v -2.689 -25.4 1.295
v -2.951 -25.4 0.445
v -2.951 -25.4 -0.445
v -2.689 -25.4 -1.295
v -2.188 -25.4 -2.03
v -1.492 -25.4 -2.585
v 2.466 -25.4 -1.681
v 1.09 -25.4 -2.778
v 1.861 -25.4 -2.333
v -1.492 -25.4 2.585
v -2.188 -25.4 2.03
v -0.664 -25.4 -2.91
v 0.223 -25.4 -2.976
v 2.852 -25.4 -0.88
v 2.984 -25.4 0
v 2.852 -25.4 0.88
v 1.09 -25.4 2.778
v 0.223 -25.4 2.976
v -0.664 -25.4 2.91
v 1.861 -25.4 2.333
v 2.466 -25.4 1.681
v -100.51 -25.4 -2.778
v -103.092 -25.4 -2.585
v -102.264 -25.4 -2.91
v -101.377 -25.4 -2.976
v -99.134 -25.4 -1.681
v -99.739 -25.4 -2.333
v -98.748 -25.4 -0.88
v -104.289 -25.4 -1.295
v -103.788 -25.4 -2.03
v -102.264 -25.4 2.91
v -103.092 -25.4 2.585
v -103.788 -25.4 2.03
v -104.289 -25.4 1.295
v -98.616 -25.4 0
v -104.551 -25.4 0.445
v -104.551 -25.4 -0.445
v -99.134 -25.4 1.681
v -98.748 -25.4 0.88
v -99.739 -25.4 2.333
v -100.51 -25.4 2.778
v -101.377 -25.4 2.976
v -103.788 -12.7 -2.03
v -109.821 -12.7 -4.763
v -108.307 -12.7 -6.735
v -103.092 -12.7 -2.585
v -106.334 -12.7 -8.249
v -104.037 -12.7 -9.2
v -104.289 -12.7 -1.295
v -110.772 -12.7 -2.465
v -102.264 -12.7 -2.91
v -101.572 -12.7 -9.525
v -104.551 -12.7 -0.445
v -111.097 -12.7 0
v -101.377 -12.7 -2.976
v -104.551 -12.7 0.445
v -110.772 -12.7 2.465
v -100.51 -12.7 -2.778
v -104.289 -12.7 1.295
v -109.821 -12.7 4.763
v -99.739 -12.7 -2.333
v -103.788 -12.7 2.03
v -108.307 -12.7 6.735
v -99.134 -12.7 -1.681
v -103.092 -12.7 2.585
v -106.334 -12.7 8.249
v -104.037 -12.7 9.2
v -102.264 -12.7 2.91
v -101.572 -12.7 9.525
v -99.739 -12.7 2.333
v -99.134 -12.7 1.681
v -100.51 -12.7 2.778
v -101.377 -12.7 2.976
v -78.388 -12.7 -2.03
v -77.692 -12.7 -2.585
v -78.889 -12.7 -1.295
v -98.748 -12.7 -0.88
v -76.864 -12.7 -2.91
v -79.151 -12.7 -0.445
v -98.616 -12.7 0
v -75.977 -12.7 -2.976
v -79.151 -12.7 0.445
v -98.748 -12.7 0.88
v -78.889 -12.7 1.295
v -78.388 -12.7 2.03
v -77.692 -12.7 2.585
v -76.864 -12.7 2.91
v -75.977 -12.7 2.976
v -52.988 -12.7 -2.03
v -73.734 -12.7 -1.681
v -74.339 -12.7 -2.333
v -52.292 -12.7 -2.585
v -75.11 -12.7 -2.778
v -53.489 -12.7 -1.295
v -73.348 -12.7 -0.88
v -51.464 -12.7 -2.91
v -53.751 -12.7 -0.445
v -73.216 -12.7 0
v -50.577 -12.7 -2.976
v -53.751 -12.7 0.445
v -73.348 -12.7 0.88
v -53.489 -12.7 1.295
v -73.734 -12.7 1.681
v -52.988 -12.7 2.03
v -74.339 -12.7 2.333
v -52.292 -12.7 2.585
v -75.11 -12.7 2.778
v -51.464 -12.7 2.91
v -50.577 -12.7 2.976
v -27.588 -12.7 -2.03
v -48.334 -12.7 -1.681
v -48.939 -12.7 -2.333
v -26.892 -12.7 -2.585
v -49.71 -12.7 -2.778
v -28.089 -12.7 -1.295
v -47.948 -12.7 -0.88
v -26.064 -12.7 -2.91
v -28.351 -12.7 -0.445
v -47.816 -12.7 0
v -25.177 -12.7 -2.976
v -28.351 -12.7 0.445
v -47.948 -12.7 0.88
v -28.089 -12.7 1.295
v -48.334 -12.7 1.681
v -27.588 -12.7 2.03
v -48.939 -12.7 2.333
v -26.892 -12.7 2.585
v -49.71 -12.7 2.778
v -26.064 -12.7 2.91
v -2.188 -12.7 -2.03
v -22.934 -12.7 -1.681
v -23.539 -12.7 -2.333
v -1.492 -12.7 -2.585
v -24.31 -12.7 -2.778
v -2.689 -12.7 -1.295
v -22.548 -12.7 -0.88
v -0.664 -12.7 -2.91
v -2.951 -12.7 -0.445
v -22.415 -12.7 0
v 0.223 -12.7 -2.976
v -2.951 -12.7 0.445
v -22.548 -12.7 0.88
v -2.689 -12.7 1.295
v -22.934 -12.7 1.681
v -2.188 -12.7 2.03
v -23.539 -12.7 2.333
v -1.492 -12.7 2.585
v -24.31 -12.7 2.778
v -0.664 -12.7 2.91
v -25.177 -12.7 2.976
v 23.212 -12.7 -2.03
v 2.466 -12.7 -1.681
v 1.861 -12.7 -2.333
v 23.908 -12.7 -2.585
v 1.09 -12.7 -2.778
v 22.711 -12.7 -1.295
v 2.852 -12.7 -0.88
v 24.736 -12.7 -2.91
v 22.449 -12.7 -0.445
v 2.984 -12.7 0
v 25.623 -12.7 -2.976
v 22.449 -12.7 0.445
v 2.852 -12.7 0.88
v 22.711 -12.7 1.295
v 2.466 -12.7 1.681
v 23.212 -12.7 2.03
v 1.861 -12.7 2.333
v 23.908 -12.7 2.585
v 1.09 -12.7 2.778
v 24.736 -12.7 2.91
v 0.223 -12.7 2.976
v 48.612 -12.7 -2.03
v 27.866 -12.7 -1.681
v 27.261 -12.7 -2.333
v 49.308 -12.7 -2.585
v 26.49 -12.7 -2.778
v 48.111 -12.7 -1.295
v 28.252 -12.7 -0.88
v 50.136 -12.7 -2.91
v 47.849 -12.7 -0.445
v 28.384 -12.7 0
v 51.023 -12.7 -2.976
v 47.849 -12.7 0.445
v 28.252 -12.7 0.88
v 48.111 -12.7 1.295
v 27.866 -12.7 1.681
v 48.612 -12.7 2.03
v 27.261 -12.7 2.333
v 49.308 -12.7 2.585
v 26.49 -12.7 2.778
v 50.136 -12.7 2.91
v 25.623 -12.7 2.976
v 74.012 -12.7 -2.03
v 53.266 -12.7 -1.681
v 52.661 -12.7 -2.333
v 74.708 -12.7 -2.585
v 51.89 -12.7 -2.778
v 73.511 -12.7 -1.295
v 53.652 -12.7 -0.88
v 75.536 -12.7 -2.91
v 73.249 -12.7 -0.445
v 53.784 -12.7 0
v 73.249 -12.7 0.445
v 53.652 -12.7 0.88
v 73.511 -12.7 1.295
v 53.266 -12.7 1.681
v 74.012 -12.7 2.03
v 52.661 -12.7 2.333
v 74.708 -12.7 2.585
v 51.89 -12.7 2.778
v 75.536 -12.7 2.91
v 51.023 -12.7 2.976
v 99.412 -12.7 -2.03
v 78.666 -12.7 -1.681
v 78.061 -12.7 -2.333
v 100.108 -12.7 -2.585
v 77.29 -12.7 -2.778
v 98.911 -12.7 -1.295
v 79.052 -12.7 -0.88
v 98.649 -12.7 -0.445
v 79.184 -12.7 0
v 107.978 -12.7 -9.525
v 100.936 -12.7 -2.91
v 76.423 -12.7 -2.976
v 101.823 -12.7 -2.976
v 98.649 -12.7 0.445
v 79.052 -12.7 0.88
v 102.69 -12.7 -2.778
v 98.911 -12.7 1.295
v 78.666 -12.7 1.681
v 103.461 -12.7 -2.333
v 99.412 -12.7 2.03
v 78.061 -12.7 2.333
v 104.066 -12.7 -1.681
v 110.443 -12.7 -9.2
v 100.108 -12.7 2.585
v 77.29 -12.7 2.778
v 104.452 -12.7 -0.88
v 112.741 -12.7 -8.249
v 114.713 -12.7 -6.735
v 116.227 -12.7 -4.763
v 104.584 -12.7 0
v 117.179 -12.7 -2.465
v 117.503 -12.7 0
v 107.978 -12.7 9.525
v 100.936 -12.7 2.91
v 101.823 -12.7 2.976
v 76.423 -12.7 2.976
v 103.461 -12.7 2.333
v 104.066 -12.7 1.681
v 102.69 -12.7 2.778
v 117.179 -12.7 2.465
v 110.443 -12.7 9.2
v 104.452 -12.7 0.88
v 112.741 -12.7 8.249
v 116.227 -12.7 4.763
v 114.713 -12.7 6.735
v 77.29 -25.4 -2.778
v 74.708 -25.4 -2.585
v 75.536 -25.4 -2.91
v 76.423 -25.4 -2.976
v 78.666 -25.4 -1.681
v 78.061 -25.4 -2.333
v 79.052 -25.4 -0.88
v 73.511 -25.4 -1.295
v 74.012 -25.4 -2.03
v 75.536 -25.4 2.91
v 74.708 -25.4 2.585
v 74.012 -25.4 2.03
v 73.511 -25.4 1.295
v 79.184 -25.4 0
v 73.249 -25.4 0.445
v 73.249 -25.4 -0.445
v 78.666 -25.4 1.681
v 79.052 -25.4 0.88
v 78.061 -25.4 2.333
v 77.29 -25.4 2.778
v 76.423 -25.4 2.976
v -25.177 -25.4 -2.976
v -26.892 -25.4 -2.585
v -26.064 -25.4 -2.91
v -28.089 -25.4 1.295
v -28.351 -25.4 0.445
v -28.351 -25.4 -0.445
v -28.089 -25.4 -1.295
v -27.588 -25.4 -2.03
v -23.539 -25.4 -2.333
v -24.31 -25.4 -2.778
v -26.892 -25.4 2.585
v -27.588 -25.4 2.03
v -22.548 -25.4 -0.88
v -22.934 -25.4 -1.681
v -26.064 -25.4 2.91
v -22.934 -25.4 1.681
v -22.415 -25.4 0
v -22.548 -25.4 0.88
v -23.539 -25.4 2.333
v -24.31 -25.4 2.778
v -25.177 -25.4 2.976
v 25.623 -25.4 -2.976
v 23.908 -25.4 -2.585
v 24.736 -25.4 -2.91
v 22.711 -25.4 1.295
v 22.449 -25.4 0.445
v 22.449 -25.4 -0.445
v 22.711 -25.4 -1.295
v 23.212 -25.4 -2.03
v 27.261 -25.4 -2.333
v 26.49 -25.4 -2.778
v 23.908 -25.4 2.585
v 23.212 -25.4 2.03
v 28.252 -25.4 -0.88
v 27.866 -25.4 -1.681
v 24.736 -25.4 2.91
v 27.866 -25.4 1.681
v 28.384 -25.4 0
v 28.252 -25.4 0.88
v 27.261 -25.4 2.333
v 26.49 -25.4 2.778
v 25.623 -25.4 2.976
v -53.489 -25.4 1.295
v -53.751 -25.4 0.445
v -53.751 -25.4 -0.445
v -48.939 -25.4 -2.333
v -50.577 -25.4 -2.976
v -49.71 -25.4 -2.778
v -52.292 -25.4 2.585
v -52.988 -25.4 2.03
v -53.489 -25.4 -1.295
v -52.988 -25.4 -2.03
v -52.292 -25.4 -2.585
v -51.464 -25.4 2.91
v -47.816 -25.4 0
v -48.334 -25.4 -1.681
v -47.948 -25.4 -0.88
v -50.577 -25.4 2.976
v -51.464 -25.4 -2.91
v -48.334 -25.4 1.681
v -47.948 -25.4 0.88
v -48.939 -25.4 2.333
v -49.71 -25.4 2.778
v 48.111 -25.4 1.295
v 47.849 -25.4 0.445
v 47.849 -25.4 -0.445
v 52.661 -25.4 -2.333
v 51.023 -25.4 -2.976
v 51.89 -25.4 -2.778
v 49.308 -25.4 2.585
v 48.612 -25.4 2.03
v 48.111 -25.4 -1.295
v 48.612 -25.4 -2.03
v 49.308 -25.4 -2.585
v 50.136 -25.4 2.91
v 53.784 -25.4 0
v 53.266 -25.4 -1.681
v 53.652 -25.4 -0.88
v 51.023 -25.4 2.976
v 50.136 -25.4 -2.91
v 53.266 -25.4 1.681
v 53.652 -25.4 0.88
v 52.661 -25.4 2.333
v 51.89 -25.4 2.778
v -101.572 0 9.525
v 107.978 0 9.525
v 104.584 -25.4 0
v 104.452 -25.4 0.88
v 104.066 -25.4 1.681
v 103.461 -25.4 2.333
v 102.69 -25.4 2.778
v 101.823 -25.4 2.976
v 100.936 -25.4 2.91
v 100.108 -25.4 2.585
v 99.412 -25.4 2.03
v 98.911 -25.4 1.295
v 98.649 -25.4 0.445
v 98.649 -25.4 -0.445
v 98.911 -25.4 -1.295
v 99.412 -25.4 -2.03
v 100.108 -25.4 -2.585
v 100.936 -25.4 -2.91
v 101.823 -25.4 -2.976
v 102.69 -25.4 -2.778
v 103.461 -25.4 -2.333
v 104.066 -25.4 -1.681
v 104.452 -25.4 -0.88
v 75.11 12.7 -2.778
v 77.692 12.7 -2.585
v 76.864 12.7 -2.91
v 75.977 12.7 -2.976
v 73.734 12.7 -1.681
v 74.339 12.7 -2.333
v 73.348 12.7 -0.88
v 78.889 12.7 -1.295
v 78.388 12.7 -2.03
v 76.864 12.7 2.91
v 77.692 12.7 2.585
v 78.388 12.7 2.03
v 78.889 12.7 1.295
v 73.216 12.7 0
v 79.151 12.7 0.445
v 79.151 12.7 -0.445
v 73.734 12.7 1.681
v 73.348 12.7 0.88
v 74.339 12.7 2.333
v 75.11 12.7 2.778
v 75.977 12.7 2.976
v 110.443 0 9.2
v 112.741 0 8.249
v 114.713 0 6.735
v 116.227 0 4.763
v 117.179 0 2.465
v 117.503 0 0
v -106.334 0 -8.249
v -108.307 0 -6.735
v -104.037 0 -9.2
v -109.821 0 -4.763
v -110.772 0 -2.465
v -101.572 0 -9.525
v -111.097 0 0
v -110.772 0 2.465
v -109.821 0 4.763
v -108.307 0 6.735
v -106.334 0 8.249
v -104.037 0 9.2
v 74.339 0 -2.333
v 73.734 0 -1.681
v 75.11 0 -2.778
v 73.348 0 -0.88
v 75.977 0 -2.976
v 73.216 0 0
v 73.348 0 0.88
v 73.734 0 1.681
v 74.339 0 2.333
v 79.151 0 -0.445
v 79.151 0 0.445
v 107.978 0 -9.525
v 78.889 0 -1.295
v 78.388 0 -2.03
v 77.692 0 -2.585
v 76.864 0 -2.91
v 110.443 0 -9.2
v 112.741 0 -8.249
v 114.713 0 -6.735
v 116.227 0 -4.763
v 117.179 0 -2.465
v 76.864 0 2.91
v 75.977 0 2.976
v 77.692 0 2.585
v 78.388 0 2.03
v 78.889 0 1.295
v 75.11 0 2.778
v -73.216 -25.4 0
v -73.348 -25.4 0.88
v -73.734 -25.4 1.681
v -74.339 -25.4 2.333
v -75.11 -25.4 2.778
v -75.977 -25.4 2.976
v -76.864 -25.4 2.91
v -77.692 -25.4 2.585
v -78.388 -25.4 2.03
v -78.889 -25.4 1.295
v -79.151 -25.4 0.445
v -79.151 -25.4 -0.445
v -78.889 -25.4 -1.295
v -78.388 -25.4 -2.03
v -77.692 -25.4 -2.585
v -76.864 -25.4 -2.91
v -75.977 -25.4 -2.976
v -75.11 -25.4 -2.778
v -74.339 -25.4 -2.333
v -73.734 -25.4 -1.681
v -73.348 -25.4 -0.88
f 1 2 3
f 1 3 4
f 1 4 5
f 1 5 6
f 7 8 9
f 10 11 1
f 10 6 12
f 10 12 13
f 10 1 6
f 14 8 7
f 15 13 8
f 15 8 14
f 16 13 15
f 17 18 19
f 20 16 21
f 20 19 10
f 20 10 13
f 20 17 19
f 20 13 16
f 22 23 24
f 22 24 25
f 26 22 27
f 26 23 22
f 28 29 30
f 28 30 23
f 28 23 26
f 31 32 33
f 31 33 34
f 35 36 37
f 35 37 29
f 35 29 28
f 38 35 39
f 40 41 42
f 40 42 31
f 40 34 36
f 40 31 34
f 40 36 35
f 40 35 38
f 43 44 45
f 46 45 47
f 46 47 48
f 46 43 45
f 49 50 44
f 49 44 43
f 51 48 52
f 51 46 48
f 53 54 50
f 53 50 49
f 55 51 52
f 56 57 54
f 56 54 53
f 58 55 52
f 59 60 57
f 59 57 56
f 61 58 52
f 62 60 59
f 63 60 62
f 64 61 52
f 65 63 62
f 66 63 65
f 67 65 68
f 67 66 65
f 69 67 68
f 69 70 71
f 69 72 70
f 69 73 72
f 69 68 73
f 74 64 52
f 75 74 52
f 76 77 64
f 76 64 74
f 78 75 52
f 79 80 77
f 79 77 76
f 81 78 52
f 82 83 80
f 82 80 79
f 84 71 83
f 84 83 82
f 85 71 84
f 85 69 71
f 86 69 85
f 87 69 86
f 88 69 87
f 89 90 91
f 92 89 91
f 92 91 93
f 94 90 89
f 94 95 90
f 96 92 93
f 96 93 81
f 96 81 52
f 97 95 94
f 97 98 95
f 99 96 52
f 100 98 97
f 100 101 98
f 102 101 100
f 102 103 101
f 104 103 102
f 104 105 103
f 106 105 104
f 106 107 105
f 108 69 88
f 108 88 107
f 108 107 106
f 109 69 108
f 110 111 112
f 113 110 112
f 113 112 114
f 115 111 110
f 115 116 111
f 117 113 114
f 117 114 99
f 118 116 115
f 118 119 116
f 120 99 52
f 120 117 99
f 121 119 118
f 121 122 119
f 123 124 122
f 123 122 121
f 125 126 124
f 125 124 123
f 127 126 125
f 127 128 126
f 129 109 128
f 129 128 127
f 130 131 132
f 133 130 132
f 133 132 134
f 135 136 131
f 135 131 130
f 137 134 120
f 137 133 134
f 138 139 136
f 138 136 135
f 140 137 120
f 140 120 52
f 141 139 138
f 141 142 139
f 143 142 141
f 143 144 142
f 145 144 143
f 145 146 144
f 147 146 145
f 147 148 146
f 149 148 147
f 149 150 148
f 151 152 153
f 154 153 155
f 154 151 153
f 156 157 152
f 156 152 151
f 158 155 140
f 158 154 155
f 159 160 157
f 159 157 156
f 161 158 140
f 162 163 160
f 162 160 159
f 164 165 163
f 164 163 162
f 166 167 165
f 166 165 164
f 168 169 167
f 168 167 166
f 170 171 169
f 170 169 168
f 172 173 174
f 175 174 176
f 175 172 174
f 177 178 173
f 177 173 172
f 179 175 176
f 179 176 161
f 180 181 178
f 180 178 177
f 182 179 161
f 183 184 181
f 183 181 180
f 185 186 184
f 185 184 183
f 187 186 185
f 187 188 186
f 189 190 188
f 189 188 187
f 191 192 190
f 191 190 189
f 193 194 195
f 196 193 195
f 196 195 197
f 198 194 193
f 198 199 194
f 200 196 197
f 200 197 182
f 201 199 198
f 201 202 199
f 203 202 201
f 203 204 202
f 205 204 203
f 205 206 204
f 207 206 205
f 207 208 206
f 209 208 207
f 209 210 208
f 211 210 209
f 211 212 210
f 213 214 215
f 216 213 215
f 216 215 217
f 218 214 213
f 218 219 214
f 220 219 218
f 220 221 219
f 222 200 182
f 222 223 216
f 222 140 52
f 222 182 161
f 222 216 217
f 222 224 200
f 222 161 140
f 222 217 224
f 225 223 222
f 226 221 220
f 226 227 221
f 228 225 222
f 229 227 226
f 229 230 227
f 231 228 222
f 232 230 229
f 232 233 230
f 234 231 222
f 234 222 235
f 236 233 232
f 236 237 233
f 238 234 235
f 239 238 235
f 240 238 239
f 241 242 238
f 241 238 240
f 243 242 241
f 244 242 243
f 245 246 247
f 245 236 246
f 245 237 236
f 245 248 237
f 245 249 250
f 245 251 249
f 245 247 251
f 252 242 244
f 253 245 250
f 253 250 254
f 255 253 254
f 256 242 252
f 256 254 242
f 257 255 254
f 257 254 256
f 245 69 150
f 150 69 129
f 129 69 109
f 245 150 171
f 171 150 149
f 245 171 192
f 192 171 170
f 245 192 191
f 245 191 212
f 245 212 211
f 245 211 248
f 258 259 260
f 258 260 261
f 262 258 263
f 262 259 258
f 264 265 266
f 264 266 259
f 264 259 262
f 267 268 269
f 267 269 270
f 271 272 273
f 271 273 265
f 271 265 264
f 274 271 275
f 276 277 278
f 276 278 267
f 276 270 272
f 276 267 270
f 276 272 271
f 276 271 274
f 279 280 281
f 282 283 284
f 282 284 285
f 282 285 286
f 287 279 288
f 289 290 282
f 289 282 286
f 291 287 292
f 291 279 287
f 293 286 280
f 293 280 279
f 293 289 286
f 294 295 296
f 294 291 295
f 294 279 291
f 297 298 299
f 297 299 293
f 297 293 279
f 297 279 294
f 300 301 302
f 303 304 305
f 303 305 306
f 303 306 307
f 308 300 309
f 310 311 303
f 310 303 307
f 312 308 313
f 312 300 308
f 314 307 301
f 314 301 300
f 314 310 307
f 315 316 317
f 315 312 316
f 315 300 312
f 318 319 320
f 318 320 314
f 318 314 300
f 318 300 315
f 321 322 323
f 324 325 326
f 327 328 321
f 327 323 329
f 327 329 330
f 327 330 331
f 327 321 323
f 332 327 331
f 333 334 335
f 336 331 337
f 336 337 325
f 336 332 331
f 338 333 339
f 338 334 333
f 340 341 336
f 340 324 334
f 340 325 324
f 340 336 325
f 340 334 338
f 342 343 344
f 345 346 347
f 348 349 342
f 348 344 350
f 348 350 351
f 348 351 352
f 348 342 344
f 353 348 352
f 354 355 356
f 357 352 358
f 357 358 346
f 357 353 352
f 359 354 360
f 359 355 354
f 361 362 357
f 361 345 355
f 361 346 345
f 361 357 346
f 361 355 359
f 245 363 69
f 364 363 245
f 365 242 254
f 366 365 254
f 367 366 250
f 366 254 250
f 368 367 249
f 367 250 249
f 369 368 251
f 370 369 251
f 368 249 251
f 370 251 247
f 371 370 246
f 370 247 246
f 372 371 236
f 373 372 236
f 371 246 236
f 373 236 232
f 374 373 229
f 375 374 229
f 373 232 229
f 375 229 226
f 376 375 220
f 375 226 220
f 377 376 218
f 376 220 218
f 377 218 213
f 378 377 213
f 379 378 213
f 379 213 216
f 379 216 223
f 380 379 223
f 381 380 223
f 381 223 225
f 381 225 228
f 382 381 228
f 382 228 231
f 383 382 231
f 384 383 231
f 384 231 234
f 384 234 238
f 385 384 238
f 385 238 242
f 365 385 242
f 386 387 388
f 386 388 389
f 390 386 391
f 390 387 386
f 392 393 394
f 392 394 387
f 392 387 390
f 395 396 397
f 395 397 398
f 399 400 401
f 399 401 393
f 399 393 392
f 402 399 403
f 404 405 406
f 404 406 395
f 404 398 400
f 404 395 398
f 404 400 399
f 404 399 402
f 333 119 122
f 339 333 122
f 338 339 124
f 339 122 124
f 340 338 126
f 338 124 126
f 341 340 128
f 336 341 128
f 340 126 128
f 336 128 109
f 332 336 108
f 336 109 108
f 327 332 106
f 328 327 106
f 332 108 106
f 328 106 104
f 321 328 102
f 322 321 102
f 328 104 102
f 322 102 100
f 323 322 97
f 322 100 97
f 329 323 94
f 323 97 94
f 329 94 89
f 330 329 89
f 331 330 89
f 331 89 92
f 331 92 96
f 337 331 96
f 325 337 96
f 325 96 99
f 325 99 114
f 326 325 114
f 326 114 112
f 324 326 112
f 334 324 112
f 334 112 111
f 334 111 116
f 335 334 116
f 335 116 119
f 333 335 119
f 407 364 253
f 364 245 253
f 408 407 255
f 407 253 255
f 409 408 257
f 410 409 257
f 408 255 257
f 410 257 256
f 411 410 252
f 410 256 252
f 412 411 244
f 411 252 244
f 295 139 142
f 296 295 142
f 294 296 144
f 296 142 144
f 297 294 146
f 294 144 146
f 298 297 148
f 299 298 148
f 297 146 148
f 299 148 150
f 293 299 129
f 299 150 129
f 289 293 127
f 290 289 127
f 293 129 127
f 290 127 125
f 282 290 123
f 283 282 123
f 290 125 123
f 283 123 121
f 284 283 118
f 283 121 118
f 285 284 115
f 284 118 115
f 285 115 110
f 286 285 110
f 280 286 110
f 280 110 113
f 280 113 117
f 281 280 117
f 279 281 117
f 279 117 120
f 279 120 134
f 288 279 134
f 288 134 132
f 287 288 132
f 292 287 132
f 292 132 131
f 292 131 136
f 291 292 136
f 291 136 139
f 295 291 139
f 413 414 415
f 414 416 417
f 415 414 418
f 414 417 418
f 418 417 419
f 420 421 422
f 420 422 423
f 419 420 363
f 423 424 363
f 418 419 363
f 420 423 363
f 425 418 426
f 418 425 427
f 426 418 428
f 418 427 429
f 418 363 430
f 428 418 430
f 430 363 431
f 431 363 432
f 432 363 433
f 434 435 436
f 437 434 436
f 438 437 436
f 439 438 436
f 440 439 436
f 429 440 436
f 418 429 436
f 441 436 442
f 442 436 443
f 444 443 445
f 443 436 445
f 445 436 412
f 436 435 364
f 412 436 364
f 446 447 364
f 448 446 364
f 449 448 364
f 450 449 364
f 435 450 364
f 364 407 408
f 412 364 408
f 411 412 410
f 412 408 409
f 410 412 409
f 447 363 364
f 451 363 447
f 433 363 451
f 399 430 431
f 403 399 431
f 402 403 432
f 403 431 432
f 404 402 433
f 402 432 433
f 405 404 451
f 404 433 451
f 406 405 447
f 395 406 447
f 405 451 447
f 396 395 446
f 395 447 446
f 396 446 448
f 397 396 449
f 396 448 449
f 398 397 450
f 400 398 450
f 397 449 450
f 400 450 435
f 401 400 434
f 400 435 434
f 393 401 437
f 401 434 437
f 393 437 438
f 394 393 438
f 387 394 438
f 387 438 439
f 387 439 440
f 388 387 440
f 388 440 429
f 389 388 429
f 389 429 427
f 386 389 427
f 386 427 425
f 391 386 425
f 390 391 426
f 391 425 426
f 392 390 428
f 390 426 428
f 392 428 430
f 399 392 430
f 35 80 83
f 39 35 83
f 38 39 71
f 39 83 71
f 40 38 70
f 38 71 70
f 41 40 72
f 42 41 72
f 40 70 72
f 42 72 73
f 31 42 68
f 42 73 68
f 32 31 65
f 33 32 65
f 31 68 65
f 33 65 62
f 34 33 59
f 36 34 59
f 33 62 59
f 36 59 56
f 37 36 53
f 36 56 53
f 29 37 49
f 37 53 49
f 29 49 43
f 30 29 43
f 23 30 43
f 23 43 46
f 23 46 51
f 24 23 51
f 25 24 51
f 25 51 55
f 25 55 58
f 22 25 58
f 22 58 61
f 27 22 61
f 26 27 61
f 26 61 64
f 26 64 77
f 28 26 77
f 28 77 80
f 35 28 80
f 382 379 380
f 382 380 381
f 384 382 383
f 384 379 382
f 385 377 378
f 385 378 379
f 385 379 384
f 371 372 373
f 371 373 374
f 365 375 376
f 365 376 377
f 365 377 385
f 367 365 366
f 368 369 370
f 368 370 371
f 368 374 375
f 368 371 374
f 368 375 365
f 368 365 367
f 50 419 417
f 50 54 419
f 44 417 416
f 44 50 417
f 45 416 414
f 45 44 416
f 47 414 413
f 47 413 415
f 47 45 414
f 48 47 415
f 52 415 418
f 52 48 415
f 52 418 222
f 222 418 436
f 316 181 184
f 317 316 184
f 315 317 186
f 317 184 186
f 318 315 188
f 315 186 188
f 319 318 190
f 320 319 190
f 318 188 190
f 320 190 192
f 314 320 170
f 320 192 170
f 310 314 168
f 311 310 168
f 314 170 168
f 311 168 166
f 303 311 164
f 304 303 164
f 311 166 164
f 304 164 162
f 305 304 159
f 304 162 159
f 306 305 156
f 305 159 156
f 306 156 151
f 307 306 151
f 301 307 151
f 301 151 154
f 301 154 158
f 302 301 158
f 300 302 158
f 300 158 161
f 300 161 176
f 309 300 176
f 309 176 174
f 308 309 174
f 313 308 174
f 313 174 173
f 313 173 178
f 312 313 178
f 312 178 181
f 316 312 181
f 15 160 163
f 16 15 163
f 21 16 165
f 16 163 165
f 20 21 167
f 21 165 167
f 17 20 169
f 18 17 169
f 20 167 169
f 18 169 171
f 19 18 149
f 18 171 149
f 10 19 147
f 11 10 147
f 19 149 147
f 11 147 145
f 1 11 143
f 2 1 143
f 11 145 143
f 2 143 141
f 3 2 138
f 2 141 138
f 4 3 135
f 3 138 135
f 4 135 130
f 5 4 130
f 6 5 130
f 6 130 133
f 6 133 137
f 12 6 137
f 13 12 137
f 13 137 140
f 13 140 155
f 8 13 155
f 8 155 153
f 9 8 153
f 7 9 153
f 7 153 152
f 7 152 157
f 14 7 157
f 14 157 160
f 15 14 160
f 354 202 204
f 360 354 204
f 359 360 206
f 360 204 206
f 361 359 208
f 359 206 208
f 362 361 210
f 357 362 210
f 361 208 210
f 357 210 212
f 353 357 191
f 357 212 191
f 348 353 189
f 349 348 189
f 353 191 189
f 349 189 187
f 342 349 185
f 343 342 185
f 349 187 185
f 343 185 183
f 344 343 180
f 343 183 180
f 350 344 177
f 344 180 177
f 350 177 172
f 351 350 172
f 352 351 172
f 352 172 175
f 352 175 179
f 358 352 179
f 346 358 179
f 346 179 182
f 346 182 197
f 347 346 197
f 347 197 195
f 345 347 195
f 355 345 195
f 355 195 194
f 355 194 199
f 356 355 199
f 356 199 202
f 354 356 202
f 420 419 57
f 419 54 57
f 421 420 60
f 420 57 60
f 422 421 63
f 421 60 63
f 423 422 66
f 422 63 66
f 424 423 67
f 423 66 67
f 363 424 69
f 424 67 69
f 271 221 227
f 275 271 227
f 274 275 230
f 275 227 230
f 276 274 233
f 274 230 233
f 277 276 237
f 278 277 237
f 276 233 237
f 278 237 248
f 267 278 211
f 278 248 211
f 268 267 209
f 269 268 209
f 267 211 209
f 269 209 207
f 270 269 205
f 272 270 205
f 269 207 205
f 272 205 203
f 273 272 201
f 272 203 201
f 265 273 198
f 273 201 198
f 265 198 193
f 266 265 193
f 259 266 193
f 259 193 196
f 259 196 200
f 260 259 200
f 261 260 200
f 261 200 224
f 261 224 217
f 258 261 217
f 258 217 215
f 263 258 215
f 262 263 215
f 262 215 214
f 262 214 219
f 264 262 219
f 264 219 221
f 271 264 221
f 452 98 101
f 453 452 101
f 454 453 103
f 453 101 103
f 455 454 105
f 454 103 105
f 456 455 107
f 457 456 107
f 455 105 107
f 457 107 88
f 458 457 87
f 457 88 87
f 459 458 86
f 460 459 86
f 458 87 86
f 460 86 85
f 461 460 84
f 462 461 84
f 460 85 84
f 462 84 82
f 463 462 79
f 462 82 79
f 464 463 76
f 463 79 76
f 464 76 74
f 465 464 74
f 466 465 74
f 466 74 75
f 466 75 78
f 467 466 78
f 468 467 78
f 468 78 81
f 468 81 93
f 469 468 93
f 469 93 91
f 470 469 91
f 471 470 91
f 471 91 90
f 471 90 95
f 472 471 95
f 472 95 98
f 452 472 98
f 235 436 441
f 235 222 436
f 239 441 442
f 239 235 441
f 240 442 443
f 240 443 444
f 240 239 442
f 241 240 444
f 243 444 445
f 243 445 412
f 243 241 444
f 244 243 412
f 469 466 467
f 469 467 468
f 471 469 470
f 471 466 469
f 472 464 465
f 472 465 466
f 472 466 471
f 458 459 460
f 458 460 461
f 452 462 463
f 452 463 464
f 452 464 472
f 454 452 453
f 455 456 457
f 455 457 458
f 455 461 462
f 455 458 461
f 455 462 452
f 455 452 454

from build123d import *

# Parameters (mm, degrees)
F0_W     = 228.6
F0_H     = 19.05
F0_R     = 2.9845
F1_DEPTH = 12.7
F2_DEPTH = 25.4
F3_R     = 2.9845
F4_DEPTH = 12.7
F5_R     = 9.52499


# Not quite as in the source:
# - a fillet or chamfer is up to 0.001 mm smaller than in the source, because OpenCascade refuses the exact size
# - a feature names something its author has since deleted; it is built from what else it names


with BuildPart() as f1:
    # F0 (on Front) → F1 (new body)
    with BuildSketch(Plane.XZ):
        with Locations((3.2032227146, 0)):
            Rectangle(F0_W, F0_H)
        with Locations((-101.6, 0)):
            Circle(F0_R, mode=Mode.SUBTRACT)
        with Locations((-76.2, 0)):
            Circle(F0_R, mode=Mode.SUBTRACT)
        with Locations((-50.8, 0)):
            Circle(F0_R, mode=Mode.SUBTRACT)
        with Locations((-25.4, 0)):
            Circle(F0_R, mode=Mode.SUBTRACT)
        Circle(F0_R, mode=Mode.SUBTRACT)
        with Locations((25.4, 0)):
            Circle(F0_R, mode=Mode.SUBTRACT)
        with Locations((50.8, 0)):
            Circle(F0_R, mode=Mode.SUBTRACT)
        with Locations((76.2, 0)):
            Circle(F0_R, mode=Mode.SUBTRACT)
        with Locations((101.6, 0)):
            Circle(F0_R, mode=Mode.SUBTRACT)
    extrude(amount=F1_DEPTH)

    # F0 (on Front) → F2 (join)
    with BuildSketch(Plane.XZ):
        Circle(F0_R)
        with Locations((-101.6, 0)):
            Circle(F0_R)
        with Locations((-76.2, 0)):
            Circle(F0_R)
        with Locations((-50.8, 0)):
            Circle(F0_R)
        with Locations((-25.4, 0)):
            Circle(F0_R)
        with Locations((25.4, 0)):
            Circle(F0_R)
        with Locations((50.8, 0)):
            Circle(F0_R)
        with Locations((76.2, 0)):
            Circle(F0_R)
        with Locations((101.6, 0)):
            Circle(F0_R)
    extrude(amount=F2_DEPTH)

    # F3 (on face) → F4 (join)
    with BuildSketch(Plane(origin=(0, 0, 0), x_dir=(-1, 0, 0), z_dir=(0, 1, 0))):
        with Locations((-76.2, 0)):
            Circle(F3_R)
    extrude(amount=F4_DEPTH)

    # F5 (radius 9.525 in the source; OpenCascade refuses exactly that, so slightly less here)
    f5_edges = [f1.edges().sort_by_distance(p)[0] for p in [
        (117.503223, -6.35, 9.525),
        (117.503223, -6.35, -9.525),
        (-111.096777, -6.35, 9.525),
        (-111.096777, -6.35, -9.525),
    ]]
    fillet(f5_edges, radius=F5_R)


solid = f1.part
